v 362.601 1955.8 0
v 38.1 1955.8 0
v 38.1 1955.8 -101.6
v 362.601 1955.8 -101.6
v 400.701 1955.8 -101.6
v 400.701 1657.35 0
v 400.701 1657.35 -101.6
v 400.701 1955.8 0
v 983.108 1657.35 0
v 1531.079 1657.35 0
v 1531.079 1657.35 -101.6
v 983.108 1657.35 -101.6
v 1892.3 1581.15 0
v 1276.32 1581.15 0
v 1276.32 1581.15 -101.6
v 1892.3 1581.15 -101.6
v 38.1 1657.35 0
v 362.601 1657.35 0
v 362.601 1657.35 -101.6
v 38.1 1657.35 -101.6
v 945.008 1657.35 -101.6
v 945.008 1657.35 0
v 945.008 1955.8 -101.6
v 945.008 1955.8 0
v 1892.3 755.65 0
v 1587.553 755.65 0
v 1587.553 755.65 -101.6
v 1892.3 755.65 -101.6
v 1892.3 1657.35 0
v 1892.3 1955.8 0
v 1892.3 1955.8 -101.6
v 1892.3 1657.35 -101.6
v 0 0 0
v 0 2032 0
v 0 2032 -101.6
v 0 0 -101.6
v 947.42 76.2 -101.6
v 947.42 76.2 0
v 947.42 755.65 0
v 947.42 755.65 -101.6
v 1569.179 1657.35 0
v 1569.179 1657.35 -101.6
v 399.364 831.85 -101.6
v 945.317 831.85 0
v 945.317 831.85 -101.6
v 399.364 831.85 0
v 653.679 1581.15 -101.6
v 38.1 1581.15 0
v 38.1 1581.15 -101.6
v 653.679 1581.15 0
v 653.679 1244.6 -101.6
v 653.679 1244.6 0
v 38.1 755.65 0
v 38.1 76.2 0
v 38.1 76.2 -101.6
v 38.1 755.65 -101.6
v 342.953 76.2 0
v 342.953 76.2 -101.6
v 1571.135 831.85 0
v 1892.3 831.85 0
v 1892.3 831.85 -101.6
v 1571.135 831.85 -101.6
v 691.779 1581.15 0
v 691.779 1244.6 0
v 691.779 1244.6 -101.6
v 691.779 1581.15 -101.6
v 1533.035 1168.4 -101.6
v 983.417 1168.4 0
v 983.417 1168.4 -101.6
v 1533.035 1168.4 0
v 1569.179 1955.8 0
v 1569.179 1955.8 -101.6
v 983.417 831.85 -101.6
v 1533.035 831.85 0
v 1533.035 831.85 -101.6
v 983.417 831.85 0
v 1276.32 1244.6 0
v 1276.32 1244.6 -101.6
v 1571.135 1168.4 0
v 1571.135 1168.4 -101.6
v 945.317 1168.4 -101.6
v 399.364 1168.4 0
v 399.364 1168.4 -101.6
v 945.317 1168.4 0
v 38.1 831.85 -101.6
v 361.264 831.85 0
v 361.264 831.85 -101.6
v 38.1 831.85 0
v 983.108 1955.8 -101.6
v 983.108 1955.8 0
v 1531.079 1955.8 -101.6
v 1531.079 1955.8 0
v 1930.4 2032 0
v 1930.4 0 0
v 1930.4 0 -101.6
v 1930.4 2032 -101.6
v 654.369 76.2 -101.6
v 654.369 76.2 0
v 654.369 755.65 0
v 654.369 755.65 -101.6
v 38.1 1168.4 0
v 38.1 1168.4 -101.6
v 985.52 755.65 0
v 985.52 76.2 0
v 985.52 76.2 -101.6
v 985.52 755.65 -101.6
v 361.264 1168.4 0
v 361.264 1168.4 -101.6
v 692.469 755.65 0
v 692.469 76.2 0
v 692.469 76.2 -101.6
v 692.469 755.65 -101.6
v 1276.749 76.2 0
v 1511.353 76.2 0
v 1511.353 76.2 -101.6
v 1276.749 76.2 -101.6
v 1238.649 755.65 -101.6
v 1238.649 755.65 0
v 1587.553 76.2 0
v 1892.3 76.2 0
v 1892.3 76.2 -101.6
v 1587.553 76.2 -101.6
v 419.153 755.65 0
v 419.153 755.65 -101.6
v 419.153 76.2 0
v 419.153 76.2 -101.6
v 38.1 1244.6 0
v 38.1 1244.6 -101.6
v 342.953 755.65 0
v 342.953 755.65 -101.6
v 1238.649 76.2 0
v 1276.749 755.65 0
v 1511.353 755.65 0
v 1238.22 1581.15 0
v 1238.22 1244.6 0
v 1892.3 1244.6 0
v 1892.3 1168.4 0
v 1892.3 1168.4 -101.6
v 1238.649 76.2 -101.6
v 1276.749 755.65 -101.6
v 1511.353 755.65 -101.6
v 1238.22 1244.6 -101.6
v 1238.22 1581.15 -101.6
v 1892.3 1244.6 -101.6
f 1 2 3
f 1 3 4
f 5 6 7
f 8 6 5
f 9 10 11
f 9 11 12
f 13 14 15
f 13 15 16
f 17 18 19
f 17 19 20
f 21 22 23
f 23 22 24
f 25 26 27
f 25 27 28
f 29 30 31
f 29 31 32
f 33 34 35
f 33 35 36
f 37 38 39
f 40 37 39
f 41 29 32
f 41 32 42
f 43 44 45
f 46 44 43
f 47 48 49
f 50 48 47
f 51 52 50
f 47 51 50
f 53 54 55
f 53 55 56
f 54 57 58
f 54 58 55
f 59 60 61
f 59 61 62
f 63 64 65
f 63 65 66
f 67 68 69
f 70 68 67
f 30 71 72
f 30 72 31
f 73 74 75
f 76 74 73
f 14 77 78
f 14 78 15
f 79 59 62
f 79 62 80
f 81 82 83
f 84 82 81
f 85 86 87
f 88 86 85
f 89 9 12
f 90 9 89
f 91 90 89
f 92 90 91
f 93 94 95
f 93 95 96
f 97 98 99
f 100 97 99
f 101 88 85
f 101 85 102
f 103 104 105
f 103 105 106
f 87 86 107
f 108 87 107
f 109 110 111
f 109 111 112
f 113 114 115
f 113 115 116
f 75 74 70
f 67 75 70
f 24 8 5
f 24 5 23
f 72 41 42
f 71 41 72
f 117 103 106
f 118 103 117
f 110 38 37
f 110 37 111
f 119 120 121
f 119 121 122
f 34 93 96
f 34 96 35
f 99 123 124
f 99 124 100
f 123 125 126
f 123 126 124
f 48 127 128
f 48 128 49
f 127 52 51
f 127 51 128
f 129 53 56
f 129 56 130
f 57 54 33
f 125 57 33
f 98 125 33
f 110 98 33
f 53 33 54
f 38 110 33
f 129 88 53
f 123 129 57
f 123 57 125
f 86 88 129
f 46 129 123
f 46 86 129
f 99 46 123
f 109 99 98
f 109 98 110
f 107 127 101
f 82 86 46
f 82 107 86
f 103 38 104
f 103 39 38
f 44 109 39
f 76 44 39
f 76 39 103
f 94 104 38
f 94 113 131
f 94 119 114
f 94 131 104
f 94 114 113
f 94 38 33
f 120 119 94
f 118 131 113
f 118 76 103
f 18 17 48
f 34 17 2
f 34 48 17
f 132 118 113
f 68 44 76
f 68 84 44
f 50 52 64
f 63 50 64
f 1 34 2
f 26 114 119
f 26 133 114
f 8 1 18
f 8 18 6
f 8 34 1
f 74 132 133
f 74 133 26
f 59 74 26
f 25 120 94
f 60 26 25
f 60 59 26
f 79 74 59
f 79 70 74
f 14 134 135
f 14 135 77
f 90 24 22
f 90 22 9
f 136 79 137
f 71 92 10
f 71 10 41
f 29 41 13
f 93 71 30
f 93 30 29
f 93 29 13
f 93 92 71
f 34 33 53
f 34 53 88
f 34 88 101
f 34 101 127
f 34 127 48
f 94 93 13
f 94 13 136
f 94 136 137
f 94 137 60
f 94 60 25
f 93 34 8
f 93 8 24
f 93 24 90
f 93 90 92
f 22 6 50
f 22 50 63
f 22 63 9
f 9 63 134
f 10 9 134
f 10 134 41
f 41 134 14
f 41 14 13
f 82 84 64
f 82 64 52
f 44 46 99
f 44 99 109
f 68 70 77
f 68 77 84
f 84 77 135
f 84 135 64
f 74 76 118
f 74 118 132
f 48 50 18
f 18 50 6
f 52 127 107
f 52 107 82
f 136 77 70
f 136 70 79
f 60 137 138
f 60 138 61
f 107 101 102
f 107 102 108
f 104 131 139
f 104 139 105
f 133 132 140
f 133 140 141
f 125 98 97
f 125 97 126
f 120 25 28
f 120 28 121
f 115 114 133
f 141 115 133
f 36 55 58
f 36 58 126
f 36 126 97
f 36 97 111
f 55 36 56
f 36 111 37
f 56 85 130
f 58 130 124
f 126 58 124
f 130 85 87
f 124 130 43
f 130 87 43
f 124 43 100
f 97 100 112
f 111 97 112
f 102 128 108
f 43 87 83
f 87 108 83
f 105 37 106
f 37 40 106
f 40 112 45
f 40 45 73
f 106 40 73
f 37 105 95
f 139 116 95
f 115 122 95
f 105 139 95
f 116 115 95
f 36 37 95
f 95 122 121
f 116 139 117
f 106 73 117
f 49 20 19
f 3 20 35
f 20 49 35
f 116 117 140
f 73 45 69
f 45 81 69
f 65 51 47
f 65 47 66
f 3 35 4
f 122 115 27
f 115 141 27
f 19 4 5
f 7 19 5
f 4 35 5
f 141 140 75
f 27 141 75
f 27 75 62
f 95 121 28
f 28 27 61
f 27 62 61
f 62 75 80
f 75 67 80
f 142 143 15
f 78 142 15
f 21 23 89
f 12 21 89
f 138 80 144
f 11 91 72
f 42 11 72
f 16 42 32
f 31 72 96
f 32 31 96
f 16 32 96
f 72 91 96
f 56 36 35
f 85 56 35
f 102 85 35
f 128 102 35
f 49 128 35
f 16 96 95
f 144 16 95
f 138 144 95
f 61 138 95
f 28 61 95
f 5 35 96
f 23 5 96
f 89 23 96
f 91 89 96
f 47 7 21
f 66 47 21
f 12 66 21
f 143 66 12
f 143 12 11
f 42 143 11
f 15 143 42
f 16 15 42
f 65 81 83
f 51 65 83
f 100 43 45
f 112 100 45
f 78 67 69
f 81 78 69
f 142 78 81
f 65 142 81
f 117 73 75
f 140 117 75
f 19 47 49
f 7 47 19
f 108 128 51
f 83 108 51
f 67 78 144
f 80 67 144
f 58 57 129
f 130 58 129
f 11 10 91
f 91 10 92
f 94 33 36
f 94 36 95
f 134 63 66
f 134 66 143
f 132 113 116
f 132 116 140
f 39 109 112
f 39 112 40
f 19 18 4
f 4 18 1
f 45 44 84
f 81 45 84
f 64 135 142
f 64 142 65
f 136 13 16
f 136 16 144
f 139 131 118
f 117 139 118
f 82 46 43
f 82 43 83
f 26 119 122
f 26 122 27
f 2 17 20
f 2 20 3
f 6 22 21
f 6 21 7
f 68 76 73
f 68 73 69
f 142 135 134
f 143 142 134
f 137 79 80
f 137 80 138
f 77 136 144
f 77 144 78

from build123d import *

# Parameters (mm, degrees)
F0_W     = 1854.2
F0_H     = 38.1
F0_W_2   = 38.1
F0_H_2   = 298.45
F0_H_3   = 336.55
F0_H_4   = 679.45
F1_DEPTH = 101.6


with BuildPart() as f1:
    # F0 (on Top) → F1 (new body)
    with BuildSketch(Plane.XY):
        with Locations((965.2, 2012.95)):
            Rectangle(F0_W, F0_H)
        Polygon((1892.3, 1955.8), (1892.3, 1993.9), (38.1, 1993.9), (38.1, 1955.8), (362.600505, 1955.8), (400.700505, 1955.8), (945.00792, 1955.8), (983.10792, 1955.8), (1531.078815, 1955.8), (1569.178815, 1955.8), align=None)
        Polygon((0, 0), (38.1, 0), (38.1, 38.1), (38.1, 76.2), (38.1, 755.65), (38.1, 793.75), (38.1, 831.85), (38.1, 1168.4), (38.1, 1206.5), (38.1, 1244.6), (38.1, 1581.15), (38.1, 1619.25), (38.1, 1657.35), (38.1, 1955.8), (38.1, 1993.9), (38.1, 2032), (0, 2032), align=None)
        with Locations((381.650505, 1806.575)):
            Rectangle(F0_W_2, F0_H_2)
        Polygon((1892.3, 1619.25), (1892.3, 1657.35), (1569.178815, 1657.35), (1531.078815, 1657.35), (983.10792, 1657.35), (945.00792, 1657.35), (400.700505, 1657.35), (362.600505, 1657.35), (38.1, 1657.35), (38.1, 1619.25), align=None)
        with Locations((964.05792, 1806.575)):
            Rectangle(F0_W_2, F0_H_2)
        with Locations((1550.128815, 1806.575)):
            Rectangle(F0_W_2, F0_H_2)
        Polygon((1892.3, 38.1), (1892.3, 0), (1930.4, 0), (1930.4, 2032), (1892.3, 2032), (1892.3, 1993.9), (1892.3, 1955.8), (1892.3, 1657.35), (1892.3, 1619.25), (1892.3, 1581.15), (1892.3, 1244.6), (1892.3, 1206.5), (1892.3, 1168.4), (1892.3, 831.85), (1892.3, 793.75), (1892.3, 755.65), (1892.3, 76.2), align=None)
        with Locations((1257.2695, 1412.875)):
            Rectangle(F0_W_2, F0_H_3)
        with Locations((672.729013, 1412.875)):
            Rectangle(F0_W_2, F0_H_3)
        Polygon((38.1, 1206.5), (1892.3, 1206.5), (1892.3, 1244.6), (1276.3195, 1244.6), (1238.2195, 1244.6), (691.779013, 1244.6), (653.679013, 1244.6), (38.1, 1244.6), align=None)
        Polygon((1571.134563, 1168.4), (1892.3, 1168.4), (1892.3, 1206.5), (38.1, 1206.5), (38.1, 1168.4), (361.264458, 1168.4), (399.364458, 1168.4), (945.316911, 1168.4), (983.416911, 1168.4), (1533.034563, 1168.4), align=None)
        with Locations((380.314458, 1000.125)):
            Rectangle(F0_W_2, F0_H_3)
        with Locations((964.366911, 1000.125)):
            Rectangle(F0_W_2, F0_H_3)
        with Locations((1552.084563, 1000.125)):
            Rectangle(F0_W_2, F0_H_3)
        Polygon((1587.552901, 755.65), (1892.3, 755.65), (1892.3, 793.75), (38.1, 793.75), (38.1, 755.65), (342.952732, 755.65), (381.052732, 755.65), (419.152732, 755.65), (654.369056, 755.65), (692.469056, 755.65), (947.420001, 755.65), (985.520001, 755.65), (1238.64913, 755.65), (1276.74913, 755.65), (1511.352901, 755.65), (1549.452901, 755.65), align=None)
        with Locations((1568.502901, 415.925)):
            Rectangle(F0_W_2, F0_H_4)
        with Locations((1530.402901, 415.925)):
            Rectangle(F0_W_2, F0_H_4)
        with Locations((1257.69913, 415.925)):
            Rectangle(F0_W_2, F0_H_4)
        with Locations((966.470001, 415.925)):
            Rectangle(F0_W_2, F0_H_4)
        with Locations((673.419056, 415.925)):
            Rectangle(F0_W_2, F0_H_4)
        with Locations((400.102732, 415.925)):
            Rectangle(F0_W_2, F0_H_4)
        with Locations((362.002732, 415.925)):
            Rectangle(F0_W_2, F0_H_4)
        Polygon((38.1, 38.1), (1892.3, 38.1), (1892.3, 76.2), (1587.552901, 76.2), (1549.452901, 76.2), (1511.352901, 76.2), (1276.74913, 76.2), (1238.64913, 76.2), (985.520001, 76.2), (947.420001, 76.2), (692.469056, 76.2), (654.369056, 76.2), (419.152732, 76.2), (381.052732, 76.2), (342.952732, 76.2), (38.1, 76.2), align=None)
        with Locations((965.2, 19.05)):
            Rectangle(F0_W, F0_H)
        Polygon((38.1, 793.75), (1892.3, 793.75), (1892.3, 831.85), (1571.134563, 831.85), (1533.034563, 831.85), (983.416911, 831.85), (945.316911, 831.85), (399.364458, 831.85), (361.264458, 831.85), (38.1, 831.85), align=None)
        Polygon((1892.3, 1581.15), (1892.3, 1619.25), (38.1, 1619.25), (38.1, 1581.15), (653.679013, 1581.15), (691.779013, 1581.15), (1238.2195, 1581.15), (1276.3195, 1581.15), align=None)
    extrude(amount=-F1_DEPTH)


solid = f1.part
